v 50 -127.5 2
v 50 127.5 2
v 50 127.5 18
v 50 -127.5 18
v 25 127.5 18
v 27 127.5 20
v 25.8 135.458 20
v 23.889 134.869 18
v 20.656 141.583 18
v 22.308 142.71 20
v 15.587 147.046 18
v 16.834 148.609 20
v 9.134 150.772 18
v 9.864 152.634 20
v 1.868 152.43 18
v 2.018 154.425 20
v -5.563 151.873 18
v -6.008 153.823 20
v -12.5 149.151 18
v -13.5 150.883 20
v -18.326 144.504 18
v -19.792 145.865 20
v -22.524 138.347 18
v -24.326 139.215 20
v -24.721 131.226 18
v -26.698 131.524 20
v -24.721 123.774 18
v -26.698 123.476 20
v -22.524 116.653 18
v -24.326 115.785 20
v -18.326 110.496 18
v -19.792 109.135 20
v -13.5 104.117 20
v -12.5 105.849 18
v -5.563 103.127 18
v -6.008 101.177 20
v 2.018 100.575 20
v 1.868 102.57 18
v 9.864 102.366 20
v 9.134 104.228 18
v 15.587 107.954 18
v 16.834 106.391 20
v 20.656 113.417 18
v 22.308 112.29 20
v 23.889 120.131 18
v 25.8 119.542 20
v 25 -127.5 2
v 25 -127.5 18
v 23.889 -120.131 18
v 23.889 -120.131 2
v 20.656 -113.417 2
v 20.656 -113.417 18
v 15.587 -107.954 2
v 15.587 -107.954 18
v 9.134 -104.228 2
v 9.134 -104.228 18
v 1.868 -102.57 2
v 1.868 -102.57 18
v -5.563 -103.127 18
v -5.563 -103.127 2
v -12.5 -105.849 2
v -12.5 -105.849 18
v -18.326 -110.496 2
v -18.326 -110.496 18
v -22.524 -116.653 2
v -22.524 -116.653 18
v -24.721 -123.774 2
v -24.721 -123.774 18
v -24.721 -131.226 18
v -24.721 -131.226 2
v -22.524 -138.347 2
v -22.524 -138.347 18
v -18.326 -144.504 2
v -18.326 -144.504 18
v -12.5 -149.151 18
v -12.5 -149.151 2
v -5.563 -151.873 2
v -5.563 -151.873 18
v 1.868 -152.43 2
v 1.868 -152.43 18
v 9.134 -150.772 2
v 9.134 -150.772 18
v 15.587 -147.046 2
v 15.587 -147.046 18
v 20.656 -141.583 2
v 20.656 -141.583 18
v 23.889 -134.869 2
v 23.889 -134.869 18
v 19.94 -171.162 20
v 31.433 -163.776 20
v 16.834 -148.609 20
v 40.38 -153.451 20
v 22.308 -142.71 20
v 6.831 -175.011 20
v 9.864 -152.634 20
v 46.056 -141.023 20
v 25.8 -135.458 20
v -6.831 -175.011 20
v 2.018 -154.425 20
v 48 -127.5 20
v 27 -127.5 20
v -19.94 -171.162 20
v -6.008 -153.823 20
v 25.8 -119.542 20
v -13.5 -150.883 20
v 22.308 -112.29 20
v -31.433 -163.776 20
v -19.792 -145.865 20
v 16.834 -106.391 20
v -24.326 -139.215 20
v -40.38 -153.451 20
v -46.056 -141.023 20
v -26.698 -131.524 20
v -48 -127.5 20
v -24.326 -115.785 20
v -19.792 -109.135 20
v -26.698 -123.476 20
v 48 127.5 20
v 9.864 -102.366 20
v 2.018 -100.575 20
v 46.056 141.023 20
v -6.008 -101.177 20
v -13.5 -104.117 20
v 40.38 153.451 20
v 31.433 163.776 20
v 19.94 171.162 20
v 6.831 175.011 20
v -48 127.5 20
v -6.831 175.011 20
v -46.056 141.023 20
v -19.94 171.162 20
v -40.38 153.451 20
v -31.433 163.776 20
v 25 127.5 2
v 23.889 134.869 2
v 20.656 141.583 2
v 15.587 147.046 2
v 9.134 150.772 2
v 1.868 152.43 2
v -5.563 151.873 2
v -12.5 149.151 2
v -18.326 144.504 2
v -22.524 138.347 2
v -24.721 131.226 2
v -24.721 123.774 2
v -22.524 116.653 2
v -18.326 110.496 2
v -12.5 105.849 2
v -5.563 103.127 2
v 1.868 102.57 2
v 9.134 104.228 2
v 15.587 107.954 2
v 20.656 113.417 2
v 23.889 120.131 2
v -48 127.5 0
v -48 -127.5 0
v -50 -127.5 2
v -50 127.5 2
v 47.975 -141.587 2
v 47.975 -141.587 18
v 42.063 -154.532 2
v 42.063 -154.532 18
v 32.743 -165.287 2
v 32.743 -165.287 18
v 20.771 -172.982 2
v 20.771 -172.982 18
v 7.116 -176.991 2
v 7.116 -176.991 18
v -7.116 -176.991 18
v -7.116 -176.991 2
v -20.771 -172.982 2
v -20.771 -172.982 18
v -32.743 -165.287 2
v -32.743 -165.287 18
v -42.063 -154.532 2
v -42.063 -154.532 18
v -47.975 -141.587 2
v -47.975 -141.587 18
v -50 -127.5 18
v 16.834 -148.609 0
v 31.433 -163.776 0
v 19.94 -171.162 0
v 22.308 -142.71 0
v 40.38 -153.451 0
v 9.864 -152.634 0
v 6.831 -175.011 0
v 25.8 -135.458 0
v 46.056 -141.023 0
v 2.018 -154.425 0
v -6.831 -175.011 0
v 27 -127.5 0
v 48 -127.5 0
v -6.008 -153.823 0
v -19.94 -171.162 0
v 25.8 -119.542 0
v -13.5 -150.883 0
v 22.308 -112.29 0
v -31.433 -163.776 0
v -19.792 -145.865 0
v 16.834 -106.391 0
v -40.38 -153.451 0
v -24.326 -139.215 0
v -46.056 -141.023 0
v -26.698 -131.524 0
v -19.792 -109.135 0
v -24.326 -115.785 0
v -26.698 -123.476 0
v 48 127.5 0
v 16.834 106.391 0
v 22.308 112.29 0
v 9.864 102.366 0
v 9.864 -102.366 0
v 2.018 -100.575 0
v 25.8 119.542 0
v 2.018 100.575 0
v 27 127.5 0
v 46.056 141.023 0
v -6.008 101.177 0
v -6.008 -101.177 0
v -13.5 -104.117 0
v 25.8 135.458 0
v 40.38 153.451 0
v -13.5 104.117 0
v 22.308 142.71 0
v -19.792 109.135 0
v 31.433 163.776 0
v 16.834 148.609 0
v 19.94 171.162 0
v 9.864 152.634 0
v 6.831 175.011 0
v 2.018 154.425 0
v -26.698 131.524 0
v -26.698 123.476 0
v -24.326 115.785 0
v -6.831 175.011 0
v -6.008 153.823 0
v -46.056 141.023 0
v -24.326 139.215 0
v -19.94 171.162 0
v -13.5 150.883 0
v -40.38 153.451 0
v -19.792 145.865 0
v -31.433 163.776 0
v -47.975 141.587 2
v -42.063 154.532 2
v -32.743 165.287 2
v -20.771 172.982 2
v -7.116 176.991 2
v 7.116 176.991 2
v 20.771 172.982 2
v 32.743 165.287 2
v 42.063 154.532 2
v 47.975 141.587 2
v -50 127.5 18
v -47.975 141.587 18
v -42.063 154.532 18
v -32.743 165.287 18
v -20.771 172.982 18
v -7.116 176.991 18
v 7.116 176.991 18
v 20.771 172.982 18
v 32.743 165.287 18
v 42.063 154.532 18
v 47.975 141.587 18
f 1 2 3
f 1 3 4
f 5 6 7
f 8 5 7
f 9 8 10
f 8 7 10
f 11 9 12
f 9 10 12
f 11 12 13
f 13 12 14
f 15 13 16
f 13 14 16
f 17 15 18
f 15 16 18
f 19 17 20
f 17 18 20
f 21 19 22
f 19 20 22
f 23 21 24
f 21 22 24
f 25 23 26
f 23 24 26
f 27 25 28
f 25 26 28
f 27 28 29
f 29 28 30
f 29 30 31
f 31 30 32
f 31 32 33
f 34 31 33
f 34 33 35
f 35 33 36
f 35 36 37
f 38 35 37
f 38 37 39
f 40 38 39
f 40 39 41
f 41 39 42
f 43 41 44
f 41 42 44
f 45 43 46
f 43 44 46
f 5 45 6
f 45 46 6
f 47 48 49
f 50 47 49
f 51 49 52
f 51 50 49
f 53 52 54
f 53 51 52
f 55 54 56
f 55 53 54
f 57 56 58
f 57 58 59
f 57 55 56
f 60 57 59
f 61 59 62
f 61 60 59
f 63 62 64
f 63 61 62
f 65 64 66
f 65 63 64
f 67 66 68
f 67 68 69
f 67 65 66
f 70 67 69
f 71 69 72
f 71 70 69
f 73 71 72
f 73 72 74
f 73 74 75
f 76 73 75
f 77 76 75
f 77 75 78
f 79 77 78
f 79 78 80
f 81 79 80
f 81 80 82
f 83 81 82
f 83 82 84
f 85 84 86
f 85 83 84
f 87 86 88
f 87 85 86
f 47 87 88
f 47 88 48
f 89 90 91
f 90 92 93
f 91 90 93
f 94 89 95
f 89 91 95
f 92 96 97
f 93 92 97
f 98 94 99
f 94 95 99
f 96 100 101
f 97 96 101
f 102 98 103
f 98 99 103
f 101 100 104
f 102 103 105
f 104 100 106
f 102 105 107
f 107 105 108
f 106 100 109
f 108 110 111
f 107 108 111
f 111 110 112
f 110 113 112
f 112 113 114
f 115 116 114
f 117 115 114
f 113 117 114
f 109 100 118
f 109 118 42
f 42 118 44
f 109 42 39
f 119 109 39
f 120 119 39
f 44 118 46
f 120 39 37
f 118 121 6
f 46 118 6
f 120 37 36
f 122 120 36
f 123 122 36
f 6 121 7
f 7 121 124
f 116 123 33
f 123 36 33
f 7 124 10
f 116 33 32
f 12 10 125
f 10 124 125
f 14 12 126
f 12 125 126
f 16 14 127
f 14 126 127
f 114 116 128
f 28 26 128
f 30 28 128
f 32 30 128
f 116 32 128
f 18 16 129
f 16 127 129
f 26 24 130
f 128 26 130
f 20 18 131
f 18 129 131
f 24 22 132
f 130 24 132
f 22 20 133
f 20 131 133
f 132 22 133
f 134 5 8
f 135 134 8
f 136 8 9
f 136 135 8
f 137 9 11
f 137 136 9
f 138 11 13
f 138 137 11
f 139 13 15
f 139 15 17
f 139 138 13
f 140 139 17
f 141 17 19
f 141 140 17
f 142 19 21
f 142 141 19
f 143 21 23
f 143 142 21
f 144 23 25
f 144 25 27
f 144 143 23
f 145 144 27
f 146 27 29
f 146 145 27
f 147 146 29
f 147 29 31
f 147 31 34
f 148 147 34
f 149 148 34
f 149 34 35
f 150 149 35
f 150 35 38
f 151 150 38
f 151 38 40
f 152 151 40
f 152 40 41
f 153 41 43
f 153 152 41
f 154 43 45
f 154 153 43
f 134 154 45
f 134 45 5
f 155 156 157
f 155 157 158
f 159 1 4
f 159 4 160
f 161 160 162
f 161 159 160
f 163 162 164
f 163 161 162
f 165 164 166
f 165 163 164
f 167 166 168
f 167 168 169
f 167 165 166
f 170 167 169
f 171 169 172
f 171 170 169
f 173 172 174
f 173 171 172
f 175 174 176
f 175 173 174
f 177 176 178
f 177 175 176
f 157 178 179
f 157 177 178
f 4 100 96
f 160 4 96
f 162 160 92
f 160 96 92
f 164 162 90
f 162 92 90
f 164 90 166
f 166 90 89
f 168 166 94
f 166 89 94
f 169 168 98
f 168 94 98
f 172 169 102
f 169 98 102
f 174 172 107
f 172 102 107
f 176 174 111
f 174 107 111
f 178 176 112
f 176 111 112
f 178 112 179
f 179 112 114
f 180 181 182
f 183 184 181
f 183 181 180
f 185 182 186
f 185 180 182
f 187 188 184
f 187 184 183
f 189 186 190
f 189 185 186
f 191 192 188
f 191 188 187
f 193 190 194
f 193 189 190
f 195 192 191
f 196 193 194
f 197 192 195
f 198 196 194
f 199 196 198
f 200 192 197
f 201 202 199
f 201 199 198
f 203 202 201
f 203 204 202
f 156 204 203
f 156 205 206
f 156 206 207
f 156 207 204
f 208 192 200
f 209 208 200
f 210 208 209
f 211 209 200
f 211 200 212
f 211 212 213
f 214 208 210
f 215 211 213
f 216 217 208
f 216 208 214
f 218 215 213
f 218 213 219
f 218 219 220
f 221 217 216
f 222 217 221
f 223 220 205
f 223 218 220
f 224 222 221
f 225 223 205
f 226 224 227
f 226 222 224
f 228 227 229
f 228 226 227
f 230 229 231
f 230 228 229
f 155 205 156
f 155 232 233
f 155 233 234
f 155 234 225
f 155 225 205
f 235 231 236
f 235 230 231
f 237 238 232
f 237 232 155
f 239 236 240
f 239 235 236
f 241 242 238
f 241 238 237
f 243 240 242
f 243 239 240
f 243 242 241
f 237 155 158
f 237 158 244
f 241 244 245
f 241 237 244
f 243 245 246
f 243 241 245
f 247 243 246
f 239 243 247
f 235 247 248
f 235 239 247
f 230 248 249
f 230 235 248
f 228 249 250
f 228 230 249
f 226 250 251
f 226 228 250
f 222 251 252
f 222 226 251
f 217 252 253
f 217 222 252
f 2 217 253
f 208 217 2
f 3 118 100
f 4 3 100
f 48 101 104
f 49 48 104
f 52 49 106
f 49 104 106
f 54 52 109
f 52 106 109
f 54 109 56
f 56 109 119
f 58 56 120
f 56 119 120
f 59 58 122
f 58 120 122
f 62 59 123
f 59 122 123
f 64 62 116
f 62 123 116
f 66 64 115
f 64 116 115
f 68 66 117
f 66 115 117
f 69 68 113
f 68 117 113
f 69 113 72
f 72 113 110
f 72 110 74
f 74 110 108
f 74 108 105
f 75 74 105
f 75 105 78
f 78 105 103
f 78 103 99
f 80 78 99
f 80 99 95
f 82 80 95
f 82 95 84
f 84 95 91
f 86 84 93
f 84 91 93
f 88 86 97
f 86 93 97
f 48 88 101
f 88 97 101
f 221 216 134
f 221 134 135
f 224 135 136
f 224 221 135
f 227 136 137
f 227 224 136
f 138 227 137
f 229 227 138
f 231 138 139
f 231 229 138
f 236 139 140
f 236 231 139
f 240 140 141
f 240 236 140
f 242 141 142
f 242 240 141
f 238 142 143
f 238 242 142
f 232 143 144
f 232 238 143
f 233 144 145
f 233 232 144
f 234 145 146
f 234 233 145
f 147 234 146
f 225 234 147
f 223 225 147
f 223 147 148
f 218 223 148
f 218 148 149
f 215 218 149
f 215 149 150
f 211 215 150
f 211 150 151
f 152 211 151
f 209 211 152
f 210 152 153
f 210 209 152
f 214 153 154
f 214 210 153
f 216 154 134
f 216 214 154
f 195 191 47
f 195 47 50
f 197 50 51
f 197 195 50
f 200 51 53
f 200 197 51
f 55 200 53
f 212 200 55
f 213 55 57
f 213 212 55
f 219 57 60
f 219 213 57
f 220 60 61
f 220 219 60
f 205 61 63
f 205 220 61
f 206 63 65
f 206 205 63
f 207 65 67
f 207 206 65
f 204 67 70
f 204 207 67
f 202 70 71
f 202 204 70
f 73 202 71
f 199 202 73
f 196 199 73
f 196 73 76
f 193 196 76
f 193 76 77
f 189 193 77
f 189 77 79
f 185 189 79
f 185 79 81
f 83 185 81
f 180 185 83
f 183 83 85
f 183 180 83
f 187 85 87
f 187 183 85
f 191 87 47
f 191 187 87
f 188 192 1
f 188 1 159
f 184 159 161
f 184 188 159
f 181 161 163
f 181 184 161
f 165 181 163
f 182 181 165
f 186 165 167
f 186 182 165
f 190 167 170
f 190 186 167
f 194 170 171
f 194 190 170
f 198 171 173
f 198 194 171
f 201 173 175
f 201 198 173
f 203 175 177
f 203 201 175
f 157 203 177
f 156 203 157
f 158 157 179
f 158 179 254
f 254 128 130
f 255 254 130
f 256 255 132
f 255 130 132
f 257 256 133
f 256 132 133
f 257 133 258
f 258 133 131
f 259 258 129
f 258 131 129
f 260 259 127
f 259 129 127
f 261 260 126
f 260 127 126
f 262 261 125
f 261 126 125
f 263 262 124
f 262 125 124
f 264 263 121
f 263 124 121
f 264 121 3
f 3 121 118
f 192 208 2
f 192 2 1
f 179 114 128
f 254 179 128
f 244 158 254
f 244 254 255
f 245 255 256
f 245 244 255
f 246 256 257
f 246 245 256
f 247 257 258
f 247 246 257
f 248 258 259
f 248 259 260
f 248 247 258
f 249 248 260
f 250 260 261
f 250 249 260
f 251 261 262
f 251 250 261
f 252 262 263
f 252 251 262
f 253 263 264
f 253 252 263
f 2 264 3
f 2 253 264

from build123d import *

# Parameters (mm, degrees)
SKETCH2_R           = 25
BOSS_EXTRUDE1_DEPTH = 20
CHAMFER1_SIZE       = 2


with BuildPart() as part:
    # Sketch2 → Boss-Extrude1 (new body)
    with BuildSketch(Plane.XY):
        with BuildLine():
            Line((50, 127.5), (50, -127.5))
            ThreePointArc((50, -127.5), (0, -177.5), (-50, -127.5))
            Line((-50, -127.5), (-50, 127.5))
            ThreePointArc((-50, 127.5), (0, 177.5), (50, 127.5))
        make_face()
        with Locations((0, 127.5)):
            Circle(SKETCH2_R, mode=Mode.SUBTRACT)
        with Locations((0, -127.5)):
            Circle(SKETCH2_R, mode=Mode.SUBTRACT)
    extrude(amount=BOSS_EXTRUDE1_DEPTH)

    # Chamfer1
    chamfer1_edges = [part.edges().sort_by_distance(p)[0] for p in [
        (-25, 127.5, 0),
        (-25, 127.5, 20),
        (0, -177.5, 20),
        (-25, -127.5, 0),
        (-25, -127.5, 20),
        (50, 0, 20),
        (0, 177.5, 20),
        (50, 0, 0),
        (0, -177.5, 0),
        (-50, 0, 0),
        (0, 177.5, 0),
        (-50, 0, 20),
    ]]
    chamfer(chamfer1_edges, length=CHAMFER1_SIZE)


solid = part.part
